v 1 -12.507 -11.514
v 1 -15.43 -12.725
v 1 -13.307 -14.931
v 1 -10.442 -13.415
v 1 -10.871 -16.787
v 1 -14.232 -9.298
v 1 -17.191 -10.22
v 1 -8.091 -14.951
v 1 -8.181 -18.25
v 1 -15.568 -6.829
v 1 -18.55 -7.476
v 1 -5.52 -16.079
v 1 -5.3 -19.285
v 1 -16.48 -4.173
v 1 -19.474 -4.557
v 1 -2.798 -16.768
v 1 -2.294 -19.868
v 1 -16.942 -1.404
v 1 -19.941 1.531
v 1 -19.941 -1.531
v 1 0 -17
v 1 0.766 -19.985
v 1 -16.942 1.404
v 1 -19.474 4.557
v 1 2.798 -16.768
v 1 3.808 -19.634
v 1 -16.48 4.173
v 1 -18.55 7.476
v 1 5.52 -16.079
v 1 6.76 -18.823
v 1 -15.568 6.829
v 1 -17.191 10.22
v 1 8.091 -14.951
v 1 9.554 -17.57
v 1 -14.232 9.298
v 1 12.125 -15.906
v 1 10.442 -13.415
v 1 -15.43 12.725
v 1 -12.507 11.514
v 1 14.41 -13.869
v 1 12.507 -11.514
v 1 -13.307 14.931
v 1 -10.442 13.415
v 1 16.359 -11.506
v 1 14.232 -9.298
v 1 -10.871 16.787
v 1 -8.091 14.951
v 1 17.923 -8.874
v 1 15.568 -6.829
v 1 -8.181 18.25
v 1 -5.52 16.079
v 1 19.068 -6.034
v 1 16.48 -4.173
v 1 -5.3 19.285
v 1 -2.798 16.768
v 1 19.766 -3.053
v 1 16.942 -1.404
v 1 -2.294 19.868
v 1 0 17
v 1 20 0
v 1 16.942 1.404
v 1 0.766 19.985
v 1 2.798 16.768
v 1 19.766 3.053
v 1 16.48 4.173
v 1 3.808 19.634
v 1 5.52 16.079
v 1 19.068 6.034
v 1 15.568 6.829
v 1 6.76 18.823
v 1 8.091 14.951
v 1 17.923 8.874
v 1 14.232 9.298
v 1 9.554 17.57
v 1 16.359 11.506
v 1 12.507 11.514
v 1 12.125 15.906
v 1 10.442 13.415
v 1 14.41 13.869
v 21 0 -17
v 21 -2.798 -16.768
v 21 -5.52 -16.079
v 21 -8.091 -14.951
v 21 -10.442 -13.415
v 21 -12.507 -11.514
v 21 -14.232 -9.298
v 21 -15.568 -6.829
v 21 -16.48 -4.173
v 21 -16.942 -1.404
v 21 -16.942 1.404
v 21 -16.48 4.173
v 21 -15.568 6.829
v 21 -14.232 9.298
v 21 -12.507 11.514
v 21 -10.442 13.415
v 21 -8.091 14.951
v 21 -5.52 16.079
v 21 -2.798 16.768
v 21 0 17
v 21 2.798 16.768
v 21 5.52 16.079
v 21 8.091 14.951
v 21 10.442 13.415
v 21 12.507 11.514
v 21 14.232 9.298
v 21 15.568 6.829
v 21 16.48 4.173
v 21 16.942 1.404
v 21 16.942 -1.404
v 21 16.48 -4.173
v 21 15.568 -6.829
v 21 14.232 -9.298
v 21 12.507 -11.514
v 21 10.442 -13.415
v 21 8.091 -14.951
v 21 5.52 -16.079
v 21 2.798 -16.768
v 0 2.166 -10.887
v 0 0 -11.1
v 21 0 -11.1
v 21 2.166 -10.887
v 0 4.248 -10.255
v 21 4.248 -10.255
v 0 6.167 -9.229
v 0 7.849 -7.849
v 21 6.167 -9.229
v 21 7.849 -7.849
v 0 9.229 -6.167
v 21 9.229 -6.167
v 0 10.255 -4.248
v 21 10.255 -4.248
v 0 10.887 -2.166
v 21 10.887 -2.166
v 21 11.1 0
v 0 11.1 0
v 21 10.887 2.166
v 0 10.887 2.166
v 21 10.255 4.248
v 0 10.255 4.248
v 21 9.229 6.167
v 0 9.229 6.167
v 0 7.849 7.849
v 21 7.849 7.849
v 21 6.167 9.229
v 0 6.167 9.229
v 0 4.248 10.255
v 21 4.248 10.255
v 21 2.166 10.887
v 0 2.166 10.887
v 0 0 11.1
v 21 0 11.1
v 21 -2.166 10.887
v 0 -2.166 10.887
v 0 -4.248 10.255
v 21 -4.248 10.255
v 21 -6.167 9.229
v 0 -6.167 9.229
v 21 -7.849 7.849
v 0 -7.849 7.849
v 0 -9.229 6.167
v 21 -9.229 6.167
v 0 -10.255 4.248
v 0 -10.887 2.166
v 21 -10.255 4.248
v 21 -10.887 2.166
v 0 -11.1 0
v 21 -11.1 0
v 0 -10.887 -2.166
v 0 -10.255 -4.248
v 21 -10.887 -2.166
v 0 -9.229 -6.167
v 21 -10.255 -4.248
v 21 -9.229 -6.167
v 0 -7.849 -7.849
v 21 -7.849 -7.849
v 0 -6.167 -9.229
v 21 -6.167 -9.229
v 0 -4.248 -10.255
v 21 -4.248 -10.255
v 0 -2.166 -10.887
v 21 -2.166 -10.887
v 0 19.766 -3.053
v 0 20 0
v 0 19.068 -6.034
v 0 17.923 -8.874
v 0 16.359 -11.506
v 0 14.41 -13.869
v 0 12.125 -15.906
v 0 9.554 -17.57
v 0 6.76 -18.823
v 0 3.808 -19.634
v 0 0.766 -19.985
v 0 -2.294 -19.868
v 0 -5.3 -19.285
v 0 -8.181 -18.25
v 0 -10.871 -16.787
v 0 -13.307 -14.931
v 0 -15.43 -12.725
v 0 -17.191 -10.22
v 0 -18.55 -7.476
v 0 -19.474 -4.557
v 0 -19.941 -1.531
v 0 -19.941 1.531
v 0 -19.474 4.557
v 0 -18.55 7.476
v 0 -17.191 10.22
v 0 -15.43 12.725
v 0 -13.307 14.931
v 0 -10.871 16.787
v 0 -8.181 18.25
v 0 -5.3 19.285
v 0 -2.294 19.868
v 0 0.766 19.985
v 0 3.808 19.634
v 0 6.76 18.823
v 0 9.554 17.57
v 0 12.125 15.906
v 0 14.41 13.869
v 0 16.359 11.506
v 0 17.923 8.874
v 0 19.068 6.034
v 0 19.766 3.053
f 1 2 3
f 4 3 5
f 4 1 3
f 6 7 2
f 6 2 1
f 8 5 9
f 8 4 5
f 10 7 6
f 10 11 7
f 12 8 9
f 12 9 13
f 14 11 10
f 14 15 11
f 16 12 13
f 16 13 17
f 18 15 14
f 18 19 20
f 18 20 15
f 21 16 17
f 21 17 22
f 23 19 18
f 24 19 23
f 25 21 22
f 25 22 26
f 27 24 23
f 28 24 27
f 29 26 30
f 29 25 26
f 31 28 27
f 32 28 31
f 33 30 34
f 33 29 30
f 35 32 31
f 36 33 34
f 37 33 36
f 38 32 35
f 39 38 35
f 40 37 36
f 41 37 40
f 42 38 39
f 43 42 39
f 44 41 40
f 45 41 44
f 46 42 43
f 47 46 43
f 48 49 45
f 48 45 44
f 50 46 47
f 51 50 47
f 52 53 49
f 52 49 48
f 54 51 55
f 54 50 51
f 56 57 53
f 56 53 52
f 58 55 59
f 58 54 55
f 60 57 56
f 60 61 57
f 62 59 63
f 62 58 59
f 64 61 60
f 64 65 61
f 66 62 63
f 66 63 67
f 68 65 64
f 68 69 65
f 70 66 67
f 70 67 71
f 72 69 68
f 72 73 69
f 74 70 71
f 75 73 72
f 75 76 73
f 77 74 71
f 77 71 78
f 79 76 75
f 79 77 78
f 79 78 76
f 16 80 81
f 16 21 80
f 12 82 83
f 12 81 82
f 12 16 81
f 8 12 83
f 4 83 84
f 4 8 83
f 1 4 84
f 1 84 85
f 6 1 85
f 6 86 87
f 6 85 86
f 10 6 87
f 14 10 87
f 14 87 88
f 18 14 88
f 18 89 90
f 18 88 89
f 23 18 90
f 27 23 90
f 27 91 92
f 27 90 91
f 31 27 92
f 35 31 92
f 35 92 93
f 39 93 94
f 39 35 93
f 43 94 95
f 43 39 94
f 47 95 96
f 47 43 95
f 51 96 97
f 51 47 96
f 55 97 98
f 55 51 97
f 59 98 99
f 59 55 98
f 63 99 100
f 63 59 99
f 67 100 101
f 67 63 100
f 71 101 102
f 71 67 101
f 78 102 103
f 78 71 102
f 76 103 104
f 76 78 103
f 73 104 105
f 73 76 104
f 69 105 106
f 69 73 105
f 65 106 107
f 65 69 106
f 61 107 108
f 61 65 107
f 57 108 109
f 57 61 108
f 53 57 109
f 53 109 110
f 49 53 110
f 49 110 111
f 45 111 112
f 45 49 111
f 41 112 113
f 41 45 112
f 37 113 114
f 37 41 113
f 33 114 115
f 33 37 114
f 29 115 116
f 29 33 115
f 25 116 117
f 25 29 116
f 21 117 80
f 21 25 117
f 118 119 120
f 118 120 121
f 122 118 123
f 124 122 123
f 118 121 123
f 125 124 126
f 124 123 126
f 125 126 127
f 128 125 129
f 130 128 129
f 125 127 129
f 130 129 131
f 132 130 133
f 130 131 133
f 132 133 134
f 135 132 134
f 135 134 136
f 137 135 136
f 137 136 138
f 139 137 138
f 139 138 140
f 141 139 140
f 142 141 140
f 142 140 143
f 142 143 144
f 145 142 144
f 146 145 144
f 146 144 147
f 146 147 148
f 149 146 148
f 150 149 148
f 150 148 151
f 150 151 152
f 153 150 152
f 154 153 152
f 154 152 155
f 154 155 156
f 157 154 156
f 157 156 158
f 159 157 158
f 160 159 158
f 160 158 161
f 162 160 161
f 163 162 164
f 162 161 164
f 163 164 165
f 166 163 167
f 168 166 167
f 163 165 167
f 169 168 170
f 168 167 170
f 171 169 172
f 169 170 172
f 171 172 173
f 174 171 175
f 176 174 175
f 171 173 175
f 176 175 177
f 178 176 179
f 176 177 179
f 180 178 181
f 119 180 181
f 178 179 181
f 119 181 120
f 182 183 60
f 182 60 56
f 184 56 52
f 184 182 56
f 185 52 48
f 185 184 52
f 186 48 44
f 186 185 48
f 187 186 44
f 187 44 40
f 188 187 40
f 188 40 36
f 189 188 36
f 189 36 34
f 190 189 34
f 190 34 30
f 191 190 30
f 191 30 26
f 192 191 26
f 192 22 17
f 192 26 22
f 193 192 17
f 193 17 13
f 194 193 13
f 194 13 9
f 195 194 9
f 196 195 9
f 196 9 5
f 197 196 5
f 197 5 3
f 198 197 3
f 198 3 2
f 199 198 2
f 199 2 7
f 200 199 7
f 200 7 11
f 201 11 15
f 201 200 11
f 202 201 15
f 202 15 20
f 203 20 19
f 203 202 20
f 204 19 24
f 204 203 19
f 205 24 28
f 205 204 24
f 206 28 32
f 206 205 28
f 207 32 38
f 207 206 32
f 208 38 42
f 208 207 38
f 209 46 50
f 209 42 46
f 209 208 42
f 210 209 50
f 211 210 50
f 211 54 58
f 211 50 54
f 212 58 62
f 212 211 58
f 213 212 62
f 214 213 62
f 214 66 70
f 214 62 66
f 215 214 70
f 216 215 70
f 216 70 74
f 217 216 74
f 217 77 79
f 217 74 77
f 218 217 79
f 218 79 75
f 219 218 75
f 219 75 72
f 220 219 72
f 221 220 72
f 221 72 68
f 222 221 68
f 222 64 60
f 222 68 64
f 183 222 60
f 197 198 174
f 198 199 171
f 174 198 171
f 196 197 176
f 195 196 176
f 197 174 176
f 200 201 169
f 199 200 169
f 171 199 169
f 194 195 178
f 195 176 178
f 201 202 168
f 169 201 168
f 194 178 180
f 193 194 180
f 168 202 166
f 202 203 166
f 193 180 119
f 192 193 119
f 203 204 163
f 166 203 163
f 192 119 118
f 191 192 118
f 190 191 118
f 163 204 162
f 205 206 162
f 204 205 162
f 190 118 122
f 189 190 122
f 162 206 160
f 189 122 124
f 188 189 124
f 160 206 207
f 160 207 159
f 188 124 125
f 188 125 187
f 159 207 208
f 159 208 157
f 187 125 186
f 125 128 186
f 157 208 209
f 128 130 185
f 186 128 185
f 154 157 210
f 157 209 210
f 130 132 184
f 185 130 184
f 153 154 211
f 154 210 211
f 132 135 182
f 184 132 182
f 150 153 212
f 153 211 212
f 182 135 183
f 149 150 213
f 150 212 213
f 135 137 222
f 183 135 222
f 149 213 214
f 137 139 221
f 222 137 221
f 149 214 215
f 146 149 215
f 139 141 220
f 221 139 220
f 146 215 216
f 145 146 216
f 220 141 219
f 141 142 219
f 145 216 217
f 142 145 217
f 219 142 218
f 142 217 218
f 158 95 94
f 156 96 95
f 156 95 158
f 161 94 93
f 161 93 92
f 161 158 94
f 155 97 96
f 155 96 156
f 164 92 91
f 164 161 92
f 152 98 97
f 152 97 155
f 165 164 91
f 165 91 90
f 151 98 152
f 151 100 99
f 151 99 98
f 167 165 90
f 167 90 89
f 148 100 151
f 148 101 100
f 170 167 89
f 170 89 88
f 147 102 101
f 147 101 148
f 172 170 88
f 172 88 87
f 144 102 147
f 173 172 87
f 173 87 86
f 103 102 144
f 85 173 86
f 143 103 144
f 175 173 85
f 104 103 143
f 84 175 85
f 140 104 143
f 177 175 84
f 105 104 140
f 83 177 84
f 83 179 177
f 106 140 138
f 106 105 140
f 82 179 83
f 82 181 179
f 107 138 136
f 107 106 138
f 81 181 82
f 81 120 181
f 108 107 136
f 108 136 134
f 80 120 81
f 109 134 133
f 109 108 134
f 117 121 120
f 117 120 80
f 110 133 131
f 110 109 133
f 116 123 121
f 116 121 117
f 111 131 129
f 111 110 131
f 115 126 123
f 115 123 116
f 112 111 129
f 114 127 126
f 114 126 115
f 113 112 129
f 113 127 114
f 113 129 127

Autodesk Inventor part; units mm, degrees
ref_plane "YZ Plane" through (0, 0, 0) normal (1, 0, 0) x (0, 1, 0)
ref_plane "XZ Plane" through (0, 0, 0) normal (0, 1, 0) x (-1, 0, 0)
ref_plane "XY Plane" through (0, 0, 0) normal (0, 0, 1) x (1, 0, 0)
sketch "Skizze1" plane through (0, 0, 0) normal (1, 0, 0) x (0, 1, 0)
  circle A0 centre (0, 0) radius 20
  dimension "d0" = 40
extrude "Extrusion1" add sketch "Skizze1" along normal blind 1
sketch "Skizze2" plane through (1, 0, 0) normal (1, 0, 0) x (0, 0, -1)
  circle A0 centre (0, 0) radius 20 projected
  circle A1 centre (0, 0) radius 17
  dimension "d3" = 34
extrude "Extrusion2" add sketch "Skizze2" along normal blind 20 contours A1
sketch "Skizze5" plane through (0, 0, 0) normal (-1, 0, 0) x (0, 0, 1)
  circle A0 centre (0, 0) radius 20 projected
  circle A1 centre (0, 0) radius 5
  dimension "d12" = 10
extrude "Extrusion5" add sketch "Skizze5" along normal blind 10 contours A1
sketch "Skizze6" plane through (21, 0, 0) normal (1, 0, 0) x (0, 0, -1)
  circle A0 centre (0, 0) radius 17 projected
  circle A1 centre (0, 0) radius 11.1
  dimension "d15" = 22.2
extrude "Extrusion6" cut sketch "Skizze6" against normal through all contours A1
properties part number "Rolle_schieber22.2"
